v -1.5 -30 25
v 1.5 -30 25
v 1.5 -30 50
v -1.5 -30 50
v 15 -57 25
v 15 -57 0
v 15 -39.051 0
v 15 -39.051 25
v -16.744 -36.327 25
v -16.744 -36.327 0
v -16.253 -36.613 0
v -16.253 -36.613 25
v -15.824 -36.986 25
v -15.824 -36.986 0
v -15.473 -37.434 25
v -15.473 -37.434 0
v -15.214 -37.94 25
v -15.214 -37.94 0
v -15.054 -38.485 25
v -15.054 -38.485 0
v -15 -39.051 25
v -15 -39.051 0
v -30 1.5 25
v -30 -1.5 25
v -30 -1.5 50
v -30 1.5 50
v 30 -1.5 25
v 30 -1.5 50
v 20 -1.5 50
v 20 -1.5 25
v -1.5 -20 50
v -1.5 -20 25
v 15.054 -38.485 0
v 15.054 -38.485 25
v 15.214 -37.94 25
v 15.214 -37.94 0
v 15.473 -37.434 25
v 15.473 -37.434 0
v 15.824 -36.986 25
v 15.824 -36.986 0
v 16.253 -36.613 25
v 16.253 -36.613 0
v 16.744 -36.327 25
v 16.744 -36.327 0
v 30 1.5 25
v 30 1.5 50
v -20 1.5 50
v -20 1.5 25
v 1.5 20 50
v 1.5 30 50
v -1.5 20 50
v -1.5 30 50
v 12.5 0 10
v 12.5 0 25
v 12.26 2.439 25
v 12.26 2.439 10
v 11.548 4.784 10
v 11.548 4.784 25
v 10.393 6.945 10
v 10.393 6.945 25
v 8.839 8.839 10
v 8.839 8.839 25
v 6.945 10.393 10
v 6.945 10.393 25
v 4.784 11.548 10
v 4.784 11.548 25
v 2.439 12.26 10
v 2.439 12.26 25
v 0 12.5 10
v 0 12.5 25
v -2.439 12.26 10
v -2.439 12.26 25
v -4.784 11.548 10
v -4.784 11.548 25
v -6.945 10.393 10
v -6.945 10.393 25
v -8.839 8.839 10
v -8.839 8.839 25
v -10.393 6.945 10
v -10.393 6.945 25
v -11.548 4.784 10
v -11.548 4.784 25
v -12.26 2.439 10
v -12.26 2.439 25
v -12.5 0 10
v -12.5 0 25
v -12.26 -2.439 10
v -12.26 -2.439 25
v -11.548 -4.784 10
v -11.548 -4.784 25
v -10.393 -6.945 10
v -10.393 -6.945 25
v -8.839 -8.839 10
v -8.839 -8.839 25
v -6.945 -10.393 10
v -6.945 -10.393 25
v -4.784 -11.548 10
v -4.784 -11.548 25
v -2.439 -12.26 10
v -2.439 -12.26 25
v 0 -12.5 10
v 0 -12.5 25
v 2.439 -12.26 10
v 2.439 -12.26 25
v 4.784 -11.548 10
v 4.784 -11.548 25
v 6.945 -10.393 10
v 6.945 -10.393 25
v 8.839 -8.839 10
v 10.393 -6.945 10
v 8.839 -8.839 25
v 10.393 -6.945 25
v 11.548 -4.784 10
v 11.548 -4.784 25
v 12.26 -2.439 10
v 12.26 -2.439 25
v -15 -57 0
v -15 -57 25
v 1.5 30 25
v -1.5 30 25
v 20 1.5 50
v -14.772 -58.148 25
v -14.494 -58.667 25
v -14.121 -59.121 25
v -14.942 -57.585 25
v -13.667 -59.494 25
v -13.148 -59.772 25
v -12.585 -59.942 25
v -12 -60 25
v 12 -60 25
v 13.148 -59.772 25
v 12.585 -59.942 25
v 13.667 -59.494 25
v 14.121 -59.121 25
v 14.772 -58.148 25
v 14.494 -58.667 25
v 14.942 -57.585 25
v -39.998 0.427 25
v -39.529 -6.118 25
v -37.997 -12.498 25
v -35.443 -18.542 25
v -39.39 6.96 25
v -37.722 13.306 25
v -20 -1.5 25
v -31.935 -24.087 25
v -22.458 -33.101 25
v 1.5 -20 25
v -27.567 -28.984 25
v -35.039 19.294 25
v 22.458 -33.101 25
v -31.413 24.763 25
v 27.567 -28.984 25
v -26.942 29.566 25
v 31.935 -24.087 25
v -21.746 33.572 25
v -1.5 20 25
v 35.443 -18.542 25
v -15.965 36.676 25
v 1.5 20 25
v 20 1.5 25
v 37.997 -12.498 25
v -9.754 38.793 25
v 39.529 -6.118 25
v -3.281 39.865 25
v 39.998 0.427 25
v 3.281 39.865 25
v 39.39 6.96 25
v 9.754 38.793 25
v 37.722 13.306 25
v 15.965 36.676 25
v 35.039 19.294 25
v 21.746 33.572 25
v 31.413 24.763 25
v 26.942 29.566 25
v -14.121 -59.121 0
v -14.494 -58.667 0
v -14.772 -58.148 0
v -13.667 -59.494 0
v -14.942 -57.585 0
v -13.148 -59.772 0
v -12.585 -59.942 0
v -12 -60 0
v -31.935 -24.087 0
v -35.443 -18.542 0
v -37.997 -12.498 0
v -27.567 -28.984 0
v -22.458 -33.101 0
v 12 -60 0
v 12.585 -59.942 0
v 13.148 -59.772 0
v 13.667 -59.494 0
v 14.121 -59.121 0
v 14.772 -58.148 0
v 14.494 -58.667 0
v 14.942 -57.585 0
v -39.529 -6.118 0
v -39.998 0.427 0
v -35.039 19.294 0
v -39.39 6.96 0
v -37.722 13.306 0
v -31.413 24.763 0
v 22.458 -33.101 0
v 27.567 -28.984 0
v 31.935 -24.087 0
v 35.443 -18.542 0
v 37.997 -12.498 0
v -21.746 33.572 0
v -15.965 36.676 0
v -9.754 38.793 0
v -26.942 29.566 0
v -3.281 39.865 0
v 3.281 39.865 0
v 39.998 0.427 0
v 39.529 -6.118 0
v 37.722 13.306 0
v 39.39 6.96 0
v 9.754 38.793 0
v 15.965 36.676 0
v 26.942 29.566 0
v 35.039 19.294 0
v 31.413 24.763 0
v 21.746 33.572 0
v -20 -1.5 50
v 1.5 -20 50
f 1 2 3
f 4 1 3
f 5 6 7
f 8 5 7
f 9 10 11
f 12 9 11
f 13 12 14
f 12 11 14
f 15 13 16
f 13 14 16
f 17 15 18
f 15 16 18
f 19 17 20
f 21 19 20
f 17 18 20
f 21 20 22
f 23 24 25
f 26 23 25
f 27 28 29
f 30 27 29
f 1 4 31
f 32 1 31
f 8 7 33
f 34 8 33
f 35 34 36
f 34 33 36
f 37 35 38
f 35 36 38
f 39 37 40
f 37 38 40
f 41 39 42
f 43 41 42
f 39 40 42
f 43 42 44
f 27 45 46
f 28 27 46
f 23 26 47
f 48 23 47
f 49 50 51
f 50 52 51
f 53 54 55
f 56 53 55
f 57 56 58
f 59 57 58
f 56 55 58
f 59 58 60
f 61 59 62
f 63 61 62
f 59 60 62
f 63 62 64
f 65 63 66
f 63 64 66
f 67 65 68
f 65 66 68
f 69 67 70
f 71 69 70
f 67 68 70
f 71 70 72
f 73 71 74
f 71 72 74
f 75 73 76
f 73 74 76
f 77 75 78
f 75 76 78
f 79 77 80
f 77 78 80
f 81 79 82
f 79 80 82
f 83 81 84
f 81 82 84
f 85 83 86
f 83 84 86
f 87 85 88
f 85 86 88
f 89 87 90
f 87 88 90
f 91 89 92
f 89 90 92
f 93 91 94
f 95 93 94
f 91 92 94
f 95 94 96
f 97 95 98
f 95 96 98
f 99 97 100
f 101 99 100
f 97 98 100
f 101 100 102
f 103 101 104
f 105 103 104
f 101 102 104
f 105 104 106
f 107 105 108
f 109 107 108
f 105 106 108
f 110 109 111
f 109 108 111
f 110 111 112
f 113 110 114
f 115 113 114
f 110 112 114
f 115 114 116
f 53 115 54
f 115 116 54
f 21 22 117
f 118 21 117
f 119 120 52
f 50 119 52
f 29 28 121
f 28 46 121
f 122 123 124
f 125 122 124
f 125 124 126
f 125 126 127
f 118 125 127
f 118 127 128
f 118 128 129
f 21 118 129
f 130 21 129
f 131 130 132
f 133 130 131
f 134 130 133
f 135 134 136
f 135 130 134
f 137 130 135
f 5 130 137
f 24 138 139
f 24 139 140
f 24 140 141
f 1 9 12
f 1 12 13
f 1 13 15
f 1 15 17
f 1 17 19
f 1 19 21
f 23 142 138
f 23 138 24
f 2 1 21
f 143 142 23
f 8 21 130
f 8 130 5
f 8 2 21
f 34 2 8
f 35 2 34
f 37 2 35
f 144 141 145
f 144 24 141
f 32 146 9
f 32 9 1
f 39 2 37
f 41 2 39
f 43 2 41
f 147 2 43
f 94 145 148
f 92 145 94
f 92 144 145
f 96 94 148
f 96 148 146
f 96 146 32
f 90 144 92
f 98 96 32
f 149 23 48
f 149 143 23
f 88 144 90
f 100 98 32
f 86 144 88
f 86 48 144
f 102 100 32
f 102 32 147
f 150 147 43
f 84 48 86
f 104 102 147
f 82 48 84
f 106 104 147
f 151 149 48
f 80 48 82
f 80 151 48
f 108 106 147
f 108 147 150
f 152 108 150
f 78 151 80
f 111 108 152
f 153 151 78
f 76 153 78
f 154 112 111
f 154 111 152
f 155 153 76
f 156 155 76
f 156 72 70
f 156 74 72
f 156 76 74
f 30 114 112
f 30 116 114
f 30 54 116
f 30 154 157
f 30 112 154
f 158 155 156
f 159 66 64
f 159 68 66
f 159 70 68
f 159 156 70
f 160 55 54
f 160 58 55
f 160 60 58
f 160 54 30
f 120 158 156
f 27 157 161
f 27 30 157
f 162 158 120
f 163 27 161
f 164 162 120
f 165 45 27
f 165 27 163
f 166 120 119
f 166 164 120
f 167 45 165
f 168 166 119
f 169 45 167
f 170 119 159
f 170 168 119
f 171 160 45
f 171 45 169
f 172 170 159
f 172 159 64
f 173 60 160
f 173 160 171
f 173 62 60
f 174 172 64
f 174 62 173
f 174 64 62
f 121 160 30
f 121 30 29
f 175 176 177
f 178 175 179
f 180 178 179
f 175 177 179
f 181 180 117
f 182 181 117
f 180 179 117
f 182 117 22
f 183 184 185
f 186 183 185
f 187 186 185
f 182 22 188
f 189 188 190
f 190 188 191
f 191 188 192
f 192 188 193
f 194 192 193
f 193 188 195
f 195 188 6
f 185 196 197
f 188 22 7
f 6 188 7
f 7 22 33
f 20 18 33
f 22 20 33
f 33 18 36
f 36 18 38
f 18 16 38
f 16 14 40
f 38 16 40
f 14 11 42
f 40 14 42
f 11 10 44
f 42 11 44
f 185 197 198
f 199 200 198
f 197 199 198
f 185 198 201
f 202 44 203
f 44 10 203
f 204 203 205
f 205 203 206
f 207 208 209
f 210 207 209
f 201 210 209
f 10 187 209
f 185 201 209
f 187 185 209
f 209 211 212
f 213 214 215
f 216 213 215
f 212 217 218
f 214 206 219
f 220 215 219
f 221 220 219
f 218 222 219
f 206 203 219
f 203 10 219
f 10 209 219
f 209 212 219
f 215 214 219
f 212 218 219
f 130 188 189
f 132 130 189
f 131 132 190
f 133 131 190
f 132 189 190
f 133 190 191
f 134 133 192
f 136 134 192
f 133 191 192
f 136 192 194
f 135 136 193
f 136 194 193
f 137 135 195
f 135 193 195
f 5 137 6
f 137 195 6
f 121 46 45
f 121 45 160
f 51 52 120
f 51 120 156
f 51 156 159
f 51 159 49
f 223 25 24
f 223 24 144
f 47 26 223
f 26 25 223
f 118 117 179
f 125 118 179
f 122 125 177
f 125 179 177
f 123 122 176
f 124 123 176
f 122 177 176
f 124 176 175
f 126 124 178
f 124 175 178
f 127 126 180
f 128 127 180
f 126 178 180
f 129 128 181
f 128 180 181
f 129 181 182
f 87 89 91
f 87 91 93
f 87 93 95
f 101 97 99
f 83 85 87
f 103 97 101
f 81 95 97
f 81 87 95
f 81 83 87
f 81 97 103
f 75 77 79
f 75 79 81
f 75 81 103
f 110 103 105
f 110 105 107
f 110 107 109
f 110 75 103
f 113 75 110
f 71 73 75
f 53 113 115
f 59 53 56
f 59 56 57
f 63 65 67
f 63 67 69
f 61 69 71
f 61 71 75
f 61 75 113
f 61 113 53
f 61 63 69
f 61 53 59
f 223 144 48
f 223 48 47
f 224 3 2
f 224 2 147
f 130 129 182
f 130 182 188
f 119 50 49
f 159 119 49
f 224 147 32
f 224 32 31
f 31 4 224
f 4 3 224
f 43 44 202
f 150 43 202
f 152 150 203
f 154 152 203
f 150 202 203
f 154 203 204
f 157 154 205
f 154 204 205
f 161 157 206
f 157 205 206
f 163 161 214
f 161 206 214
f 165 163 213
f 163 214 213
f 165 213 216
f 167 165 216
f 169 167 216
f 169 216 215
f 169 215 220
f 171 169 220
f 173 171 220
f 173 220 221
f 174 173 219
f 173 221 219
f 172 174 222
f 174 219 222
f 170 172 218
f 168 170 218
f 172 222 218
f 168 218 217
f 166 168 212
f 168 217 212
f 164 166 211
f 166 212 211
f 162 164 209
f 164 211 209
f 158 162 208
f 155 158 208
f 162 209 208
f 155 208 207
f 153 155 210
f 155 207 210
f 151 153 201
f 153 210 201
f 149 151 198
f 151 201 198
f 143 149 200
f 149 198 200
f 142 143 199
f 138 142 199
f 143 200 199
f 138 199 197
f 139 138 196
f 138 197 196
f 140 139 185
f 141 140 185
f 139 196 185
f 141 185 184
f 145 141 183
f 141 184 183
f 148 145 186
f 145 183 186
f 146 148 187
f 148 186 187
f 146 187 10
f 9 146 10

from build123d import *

# Parameters (mm, degrees)
F1_DEPTH        = 25
F2_R            = 12.5
F3_DEPTH        = 15
F4_W            = 10
F4_H            = 25
F5_DEPTH        = 1.5
F5_COPIES_COUNT = 4


# Not quite as in the source:
# - a pattern or mirror of a feature is missing from the dataset's text; its kind, count and spacing are read off the source's solid


with BuildPart() as f1:
    # F0 (on Top) → F1 (new body)
    with BuildSketch(Plane.XY):
        with BuildLine():
            ThreePointArc((15, -39.0512483795), (15.4733973541, -37.4337567815), (16.7441860465, -36.3267426786))
            ThreePointArc((16.7441860465, -36.3267426786), (0, 40), (-16.7441860465, -36.3267426786))
            ThreePointArc((-16.7441860465, -36.3267426786), (-15.4733973541, -37.4337567815), (-15, -39.0512483795))
            Line((-15, -39.0512483795), (-15, -57))
            ThreePointArc((-15, -57), (-14.1213203436, -59.1213203436), (-12, -60))
            Line((-12, -60), (12, -60))
            ThreePointArc((12, -60), (14.1213203436, -59.1213203436), (15, -57))
            Line((15, -57), (15, -39.0512483795))
        make_face()
    extrude(amount=F1_DEPTH)

    # F2 (on face) → F3 (cut)
    with BuildSketch(Plane.XY.offset(25)):
        Circle(F2_R)
    extrude(amount=-F3_DEPTH, mode=Mode.SUBTRACT)

    # F4 (on Right) → F5 (join, symmetric)
    with BuildSketch(Plane.YZ):
        with Locations((-25, 37.5)):
            Rectangle(F4_W, F4_H)
    f5 = extrude(amount=F5_DEPTH, both=True)

    # F5_copies: F5 ×4 about axis
    f5_copies_axis = Axis((0, 0, 0), (0, 0, 1))
    for i in range(1, F5_COPIES_COUNT):
        add(f5.rotate(f5_copies_axis, i * 360 / F5_COPIES_COUNT))


solid = f1.part
